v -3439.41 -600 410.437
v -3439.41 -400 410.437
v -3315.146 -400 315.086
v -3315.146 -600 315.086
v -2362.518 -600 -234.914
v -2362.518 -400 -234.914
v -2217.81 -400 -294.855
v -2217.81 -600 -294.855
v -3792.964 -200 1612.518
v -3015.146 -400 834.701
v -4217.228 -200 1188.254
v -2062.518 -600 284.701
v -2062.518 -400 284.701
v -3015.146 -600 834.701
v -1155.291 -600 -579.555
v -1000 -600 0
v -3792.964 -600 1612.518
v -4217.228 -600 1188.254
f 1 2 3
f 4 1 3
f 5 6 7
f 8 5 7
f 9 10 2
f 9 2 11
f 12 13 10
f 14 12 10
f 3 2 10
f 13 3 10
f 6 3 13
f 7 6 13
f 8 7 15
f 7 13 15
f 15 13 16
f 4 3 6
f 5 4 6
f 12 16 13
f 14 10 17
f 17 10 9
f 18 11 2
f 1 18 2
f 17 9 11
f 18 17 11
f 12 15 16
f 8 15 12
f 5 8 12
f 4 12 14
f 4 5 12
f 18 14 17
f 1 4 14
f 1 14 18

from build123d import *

# Parameters (mm, degrees)
BOSS_EXTRUDE1_DEPTH = 600
CUT_EXTRUDE1_DEPTH  = 600
CUT_EXTRUDE2_DEPTH  = 600
SKETCH26_W          = 1100
SKETCH26_H          = 400
CUT_EXTRUDE3_DEPTH  = 600
SKETCH27_W          = 156.631430664
SKETCH27_H          = 400
CUT_EXTRUDE4_DEPTH  = 600
CUT_EXTRUDE6_DEPTH  = 400
CUT_EXTRUDE7_DEPTH  = 600


with BuildPart() as part:
    # Sketch1 → Boss-Extrude1 (new body)
    with BuildSketch(Plane(origin=(0, 0, 0), x_dir=(1, 0, 0), z_dir=(0, 1, 0))):
        Polygon((0, 0), (-1000, 0), (-2062.518408918, -284.700949613), (-3015.146353081, -834.700949613), (-3792.963812386, -1612.518408918), (-4217.227881098, -1188.254340206), (-3439.410421793, -410.436880901), (-3315.146353081, -315.085707342), (-2362.518408918, 234.914292658), (-2217.809835979, 294.854546161), (-1155.291427062, 579.555495773), (-1000, 600), (0, 600), align=None)
    extrude(amount=-BOSS_EXTRUDE1_DEPTH)

    # Sketch24 → Cut-Extrude1 (cut)
    with BuildSketch(Plane(origin=(0, 0, 0), x_dir=(1, 0, 0), z_dir=(0, 1, 0))):
        Polygon((-1000, 0), (-1155.291427062, 579.555495773), (-1000, 600), (0, 600), (0, 0), align=None)
    extrude(amount=-CUT_EXTRUDE1_DEPTH, mode=Mode.SUBTRACT)

    # Sketch25 → Cut-Extrude2 (cut)
    with BuildSketch(Plane(origin=(-66.987298108, 0, -250), x_dir=(0.96592582628907, 0, -0.2588190451025147), z_dir=(0.25881904510251463, 0, 0.9659258262890699))):
        Polygon((-2065.925826289, -400), (-965.925826289, -600), (-965.925826289, 0), (-2065.925826289, 0), align=None)
    extrude(amount=-CUT_EXTRUDE2_DEPTH, mode=Mode.SUBTRACT)

    # Sketch26 → Cut-Extrude3 (cut)
    with BuildSketch(Plane(origin=(-392.350474806, 0, -679.570956738), x_dir=(0.8660254037844415, 0, -0.4999999999999951), z_dir=(0.49999999999999517, 0, 0.8660254037844416))):
        with Locations((-2478.543812702, -200)):
            Rectangle(SKETCH26_W, SKETCH26_H)
    extrude(amount=-CUT_EXTRUDE3_DEPTH, mode=Mode.SUBTRACT)

    # Sketch27 → Cut-Extrude4 (cut)
    with BuildSketch(Plane(origin=(-429.037555315, 0, -1035.788284809), x_dir=(-0.9238795325112855, 0, 0.38268343236509267), z_dir=(-0.38268343236509267, 0, -0.9238795325112855))):
        with Locations((2014.468880022, -200)):
            Rectangle(SKETCH27_W, SKETCH27_H)
    extrude(amount=-CUT_EXTRUDE4_DEPTH, mode=Mode.SUBTRACT)

    # Sketch30 → Cut-Extrude6 (cut)
    with BuildSketch(Plane(origin=(0, 0, 0), x_dir=(1, 0, 0), z_dir=(0, 1, 0))):
        Polygon((-3439.410421793, -410.436880901), (-3015.146353081, -834.700949613), (-3315.146353081, -315.085707342), align=None)
    extrude(amount=-CUT_EXTRUDE6_DEPTH, mode=Mode.SUBTRACT)

    # Sketch31 → Cut-Extrude7 (cut)
    with BuildSketch(Plane(origin=(-1090.222701734, 0, -1090.222701734), x_dir=(0.7071067811865475, 0, -0.7071067811865477), z_dir=(0.7071067811865477, 0, 0.7071067811865475))):
        Polygon((-2722.253134267, -400), (-3822.253134267, -200), (-3822.253134267, 0), (-2722.253134267, 0), align=None)
    extrude(amount=-CUT_EXTRUDE7_DEPTH, mode=Mode.SUBTRACT)


solid = part.part
